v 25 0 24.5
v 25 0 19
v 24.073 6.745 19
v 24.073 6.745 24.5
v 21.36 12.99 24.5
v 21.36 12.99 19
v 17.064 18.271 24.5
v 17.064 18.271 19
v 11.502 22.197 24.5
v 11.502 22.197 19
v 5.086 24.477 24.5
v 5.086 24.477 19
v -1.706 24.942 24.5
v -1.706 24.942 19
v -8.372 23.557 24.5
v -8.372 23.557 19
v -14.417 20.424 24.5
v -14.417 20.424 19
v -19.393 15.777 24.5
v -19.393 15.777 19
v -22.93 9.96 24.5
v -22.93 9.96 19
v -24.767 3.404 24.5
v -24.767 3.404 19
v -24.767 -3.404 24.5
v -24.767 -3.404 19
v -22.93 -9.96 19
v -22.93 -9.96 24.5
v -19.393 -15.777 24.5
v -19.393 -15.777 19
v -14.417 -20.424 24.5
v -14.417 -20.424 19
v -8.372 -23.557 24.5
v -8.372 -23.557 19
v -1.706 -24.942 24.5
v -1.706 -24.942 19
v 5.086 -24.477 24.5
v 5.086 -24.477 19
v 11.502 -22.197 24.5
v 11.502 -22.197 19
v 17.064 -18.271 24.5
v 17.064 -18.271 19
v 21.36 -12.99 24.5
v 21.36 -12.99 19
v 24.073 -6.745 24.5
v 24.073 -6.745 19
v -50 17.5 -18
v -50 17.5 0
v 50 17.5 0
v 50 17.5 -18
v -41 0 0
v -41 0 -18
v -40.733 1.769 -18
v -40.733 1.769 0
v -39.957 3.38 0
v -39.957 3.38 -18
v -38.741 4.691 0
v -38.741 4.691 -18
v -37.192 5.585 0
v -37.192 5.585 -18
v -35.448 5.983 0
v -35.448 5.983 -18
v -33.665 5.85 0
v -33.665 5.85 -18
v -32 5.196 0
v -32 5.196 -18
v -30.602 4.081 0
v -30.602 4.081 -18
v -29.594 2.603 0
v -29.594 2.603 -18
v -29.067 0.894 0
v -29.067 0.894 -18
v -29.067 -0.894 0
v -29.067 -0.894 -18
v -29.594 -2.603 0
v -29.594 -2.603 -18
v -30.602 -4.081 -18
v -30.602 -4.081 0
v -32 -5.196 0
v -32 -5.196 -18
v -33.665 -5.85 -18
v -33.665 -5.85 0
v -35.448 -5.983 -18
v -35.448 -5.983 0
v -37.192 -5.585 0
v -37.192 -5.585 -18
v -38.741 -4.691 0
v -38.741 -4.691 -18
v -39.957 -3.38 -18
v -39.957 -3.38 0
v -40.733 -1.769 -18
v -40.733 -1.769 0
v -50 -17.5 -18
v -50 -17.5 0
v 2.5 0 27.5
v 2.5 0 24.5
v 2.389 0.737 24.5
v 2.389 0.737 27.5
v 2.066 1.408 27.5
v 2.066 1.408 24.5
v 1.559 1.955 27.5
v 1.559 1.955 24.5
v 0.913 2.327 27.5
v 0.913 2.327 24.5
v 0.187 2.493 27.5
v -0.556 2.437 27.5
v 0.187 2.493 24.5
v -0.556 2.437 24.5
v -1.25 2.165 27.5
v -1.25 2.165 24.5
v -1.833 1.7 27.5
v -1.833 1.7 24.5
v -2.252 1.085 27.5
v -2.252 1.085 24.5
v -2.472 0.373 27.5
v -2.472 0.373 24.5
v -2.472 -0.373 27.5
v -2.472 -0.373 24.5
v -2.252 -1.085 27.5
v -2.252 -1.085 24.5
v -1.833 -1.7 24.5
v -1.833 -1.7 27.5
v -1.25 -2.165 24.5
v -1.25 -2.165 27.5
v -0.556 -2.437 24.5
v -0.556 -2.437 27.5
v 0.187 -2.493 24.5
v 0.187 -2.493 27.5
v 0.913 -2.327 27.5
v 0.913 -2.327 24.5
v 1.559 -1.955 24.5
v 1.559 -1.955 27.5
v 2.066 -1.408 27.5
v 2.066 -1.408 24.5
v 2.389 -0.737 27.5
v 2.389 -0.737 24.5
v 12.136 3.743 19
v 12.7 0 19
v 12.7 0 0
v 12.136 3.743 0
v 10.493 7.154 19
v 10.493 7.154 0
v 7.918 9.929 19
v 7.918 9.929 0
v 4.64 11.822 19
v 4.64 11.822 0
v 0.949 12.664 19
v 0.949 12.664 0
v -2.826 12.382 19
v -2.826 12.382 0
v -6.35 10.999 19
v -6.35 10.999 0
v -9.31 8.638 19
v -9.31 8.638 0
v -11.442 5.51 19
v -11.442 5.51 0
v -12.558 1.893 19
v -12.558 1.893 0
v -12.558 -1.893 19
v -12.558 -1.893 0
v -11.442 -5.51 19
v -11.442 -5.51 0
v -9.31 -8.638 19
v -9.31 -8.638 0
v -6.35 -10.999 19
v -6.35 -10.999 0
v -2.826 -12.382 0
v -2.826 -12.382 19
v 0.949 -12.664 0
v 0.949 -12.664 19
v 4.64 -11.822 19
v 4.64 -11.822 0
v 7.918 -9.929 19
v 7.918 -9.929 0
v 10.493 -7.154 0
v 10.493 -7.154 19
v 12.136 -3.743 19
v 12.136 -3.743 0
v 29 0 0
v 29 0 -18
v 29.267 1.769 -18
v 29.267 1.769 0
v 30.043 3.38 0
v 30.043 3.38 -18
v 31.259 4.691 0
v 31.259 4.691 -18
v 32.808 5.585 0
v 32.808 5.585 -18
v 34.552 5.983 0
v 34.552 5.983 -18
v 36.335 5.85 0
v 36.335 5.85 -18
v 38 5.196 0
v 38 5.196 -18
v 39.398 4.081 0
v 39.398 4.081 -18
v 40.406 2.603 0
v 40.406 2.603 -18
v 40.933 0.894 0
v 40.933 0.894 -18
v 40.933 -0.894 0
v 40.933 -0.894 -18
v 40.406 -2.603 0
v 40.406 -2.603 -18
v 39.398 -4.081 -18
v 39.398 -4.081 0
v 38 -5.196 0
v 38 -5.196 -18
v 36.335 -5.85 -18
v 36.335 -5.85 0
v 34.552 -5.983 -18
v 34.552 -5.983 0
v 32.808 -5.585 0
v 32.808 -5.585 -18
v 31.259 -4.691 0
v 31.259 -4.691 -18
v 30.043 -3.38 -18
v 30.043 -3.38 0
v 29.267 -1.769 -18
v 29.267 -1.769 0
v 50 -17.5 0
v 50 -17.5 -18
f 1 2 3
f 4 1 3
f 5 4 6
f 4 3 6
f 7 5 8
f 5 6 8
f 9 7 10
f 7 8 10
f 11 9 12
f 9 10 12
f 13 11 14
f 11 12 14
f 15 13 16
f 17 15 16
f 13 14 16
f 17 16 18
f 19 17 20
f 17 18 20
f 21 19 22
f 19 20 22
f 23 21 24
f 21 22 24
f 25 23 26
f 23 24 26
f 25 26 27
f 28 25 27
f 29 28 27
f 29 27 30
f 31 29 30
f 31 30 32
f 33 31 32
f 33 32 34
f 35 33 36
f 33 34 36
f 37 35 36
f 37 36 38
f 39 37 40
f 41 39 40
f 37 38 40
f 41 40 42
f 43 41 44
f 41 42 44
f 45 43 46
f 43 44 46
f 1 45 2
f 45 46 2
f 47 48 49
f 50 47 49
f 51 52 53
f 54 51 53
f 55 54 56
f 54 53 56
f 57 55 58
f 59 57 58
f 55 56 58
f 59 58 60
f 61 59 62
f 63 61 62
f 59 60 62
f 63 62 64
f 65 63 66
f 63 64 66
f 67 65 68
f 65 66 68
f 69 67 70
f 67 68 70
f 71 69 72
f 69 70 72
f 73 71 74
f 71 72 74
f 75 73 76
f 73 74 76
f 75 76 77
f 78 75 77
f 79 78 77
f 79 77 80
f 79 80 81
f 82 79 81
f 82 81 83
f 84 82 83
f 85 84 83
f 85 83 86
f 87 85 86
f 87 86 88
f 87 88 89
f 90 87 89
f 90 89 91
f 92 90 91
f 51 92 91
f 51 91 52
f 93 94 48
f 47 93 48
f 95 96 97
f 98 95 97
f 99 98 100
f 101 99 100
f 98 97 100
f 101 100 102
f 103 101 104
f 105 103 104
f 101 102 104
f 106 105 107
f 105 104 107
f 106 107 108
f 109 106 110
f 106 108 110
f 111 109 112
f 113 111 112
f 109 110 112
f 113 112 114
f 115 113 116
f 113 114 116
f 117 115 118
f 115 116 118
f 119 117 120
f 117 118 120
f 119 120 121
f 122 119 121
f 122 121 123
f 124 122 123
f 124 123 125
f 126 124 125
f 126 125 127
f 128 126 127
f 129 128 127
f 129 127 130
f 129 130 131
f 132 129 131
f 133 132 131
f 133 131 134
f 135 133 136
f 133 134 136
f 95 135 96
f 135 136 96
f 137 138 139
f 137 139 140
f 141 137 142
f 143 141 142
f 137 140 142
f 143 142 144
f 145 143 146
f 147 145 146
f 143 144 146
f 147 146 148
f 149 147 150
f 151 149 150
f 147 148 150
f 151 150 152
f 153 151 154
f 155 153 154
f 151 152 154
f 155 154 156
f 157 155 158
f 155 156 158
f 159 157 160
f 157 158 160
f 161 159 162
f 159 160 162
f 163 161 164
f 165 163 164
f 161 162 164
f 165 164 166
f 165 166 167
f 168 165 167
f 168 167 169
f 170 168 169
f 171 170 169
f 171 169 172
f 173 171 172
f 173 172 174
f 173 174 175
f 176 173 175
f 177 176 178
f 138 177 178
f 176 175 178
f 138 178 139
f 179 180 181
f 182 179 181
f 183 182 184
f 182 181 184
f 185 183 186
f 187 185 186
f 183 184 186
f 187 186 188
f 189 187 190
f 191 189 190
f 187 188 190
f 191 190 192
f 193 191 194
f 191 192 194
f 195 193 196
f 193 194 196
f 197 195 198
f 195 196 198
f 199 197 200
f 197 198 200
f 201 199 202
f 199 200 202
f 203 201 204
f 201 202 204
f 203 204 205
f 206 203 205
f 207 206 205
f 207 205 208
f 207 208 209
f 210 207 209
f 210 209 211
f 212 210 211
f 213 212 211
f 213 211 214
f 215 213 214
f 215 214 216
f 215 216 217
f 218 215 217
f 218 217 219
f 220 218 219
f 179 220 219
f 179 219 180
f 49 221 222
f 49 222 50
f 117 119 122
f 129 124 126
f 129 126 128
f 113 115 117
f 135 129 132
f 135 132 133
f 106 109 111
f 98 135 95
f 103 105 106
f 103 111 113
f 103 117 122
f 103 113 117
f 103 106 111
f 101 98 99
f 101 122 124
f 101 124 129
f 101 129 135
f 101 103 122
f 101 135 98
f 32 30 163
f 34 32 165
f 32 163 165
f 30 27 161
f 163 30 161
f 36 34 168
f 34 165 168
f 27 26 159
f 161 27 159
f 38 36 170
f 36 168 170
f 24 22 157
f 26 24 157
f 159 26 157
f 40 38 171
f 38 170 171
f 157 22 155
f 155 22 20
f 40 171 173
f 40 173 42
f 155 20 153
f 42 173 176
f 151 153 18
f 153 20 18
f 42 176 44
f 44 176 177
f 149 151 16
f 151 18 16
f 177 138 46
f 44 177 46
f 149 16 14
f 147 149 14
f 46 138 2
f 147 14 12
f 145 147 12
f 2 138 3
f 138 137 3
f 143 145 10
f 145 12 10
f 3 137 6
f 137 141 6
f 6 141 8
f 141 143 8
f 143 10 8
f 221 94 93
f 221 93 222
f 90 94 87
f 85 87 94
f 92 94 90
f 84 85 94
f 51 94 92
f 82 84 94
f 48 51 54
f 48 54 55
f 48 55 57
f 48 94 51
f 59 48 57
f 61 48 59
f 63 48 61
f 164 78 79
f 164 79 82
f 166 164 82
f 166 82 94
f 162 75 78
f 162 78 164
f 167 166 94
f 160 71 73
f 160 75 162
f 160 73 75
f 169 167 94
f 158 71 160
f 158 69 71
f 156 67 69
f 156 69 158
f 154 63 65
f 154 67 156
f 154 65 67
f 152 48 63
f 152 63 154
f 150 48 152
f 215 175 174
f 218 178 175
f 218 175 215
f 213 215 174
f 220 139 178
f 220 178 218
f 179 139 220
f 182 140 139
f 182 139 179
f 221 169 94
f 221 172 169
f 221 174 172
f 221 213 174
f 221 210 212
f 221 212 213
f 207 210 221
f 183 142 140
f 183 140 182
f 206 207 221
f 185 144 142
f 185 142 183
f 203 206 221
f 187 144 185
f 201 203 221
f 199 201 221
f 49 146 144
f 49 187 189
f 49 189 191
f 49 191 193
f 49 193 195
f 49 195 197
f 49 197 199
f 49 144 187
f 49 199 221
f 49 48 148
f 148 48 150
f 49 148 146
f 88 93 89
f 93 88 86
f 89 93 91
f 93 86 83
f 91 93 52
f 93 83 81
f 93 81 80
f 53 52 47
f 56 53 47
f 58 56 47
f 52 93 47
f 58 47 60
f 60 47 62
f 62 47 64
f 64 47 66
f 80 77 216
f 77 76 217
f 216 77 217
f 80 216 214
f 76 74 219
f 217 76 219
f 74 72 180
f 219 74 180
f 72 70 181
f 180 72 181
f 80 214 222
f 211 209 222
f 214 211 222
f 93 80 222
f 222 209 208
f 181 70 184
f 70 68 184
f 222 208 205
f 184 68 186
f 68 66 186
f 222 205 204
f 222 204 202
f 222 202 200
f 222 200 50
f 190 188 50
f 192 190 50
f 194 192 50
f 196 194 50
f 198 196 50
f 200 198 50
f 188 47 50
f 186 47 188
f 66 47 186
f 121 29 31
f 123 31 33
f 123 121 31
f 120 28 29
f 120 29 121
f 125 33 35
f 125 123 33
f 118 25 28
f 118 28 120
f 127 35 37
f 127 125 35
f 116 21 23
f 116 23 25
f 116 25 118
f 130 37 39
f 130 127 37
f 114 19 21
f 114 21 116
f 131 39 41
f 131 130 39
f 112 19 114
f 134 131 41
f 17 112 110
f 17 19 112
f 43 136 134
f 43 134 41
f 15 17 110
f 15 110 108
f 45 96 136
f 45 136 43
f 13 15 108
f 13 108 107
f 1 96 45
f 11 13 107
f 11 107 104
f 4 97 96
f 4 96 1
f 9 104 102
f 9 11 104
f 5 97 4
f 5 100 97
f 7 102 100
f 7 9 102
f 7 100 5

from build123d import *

# Parameters (mm, degrees)
F0_W     = 100
F0_H     = 35
F1_DEPTH = 18
F3_D     = 12
F4_R     = 12.7
F5_DEPTH = 19
F6_R     = 25
F6_R_2   = 12.7
F7_DEPTH = 5.5
F8_R     = 2.5
F9_DEPTH = 3


with BuildPart() as f1:
    # F0 (on Top) → F1 (new body)
    with BuildSketch(Plane.XY):
        Rectangle(F0_W, F0_H)
    extrude(amount=-F1_DEPTH)

    # F3 (through all)
    with Locations(Plane.XY):
        with Locations((-35, 0), (35, 0)):
            Hole(F3_D / 2)

    # F4 (on face) → F5 (join)
    with BuildSketch(Plane.XY):
        Circle(F4_R)
    extrude(amount=F5_DEPTH)

    # F6 (on face) → F7 (join)
    with BuildSketch(Plane.XY.offset(19)):
        Circle(F6_R)
        Circle(F6_R_2, mode=Mode.SUBTRACT)
        Circle(F6_R_2)
    extrude(amount=F7_DEPTH)

    # F8 (on face) → F9 (join)
    with BuildSketch(Plane.XY.offset(24.5)):
        Circle(F8_R)
    extrude(amount=F9_DEPTH)


solid = f1.part
